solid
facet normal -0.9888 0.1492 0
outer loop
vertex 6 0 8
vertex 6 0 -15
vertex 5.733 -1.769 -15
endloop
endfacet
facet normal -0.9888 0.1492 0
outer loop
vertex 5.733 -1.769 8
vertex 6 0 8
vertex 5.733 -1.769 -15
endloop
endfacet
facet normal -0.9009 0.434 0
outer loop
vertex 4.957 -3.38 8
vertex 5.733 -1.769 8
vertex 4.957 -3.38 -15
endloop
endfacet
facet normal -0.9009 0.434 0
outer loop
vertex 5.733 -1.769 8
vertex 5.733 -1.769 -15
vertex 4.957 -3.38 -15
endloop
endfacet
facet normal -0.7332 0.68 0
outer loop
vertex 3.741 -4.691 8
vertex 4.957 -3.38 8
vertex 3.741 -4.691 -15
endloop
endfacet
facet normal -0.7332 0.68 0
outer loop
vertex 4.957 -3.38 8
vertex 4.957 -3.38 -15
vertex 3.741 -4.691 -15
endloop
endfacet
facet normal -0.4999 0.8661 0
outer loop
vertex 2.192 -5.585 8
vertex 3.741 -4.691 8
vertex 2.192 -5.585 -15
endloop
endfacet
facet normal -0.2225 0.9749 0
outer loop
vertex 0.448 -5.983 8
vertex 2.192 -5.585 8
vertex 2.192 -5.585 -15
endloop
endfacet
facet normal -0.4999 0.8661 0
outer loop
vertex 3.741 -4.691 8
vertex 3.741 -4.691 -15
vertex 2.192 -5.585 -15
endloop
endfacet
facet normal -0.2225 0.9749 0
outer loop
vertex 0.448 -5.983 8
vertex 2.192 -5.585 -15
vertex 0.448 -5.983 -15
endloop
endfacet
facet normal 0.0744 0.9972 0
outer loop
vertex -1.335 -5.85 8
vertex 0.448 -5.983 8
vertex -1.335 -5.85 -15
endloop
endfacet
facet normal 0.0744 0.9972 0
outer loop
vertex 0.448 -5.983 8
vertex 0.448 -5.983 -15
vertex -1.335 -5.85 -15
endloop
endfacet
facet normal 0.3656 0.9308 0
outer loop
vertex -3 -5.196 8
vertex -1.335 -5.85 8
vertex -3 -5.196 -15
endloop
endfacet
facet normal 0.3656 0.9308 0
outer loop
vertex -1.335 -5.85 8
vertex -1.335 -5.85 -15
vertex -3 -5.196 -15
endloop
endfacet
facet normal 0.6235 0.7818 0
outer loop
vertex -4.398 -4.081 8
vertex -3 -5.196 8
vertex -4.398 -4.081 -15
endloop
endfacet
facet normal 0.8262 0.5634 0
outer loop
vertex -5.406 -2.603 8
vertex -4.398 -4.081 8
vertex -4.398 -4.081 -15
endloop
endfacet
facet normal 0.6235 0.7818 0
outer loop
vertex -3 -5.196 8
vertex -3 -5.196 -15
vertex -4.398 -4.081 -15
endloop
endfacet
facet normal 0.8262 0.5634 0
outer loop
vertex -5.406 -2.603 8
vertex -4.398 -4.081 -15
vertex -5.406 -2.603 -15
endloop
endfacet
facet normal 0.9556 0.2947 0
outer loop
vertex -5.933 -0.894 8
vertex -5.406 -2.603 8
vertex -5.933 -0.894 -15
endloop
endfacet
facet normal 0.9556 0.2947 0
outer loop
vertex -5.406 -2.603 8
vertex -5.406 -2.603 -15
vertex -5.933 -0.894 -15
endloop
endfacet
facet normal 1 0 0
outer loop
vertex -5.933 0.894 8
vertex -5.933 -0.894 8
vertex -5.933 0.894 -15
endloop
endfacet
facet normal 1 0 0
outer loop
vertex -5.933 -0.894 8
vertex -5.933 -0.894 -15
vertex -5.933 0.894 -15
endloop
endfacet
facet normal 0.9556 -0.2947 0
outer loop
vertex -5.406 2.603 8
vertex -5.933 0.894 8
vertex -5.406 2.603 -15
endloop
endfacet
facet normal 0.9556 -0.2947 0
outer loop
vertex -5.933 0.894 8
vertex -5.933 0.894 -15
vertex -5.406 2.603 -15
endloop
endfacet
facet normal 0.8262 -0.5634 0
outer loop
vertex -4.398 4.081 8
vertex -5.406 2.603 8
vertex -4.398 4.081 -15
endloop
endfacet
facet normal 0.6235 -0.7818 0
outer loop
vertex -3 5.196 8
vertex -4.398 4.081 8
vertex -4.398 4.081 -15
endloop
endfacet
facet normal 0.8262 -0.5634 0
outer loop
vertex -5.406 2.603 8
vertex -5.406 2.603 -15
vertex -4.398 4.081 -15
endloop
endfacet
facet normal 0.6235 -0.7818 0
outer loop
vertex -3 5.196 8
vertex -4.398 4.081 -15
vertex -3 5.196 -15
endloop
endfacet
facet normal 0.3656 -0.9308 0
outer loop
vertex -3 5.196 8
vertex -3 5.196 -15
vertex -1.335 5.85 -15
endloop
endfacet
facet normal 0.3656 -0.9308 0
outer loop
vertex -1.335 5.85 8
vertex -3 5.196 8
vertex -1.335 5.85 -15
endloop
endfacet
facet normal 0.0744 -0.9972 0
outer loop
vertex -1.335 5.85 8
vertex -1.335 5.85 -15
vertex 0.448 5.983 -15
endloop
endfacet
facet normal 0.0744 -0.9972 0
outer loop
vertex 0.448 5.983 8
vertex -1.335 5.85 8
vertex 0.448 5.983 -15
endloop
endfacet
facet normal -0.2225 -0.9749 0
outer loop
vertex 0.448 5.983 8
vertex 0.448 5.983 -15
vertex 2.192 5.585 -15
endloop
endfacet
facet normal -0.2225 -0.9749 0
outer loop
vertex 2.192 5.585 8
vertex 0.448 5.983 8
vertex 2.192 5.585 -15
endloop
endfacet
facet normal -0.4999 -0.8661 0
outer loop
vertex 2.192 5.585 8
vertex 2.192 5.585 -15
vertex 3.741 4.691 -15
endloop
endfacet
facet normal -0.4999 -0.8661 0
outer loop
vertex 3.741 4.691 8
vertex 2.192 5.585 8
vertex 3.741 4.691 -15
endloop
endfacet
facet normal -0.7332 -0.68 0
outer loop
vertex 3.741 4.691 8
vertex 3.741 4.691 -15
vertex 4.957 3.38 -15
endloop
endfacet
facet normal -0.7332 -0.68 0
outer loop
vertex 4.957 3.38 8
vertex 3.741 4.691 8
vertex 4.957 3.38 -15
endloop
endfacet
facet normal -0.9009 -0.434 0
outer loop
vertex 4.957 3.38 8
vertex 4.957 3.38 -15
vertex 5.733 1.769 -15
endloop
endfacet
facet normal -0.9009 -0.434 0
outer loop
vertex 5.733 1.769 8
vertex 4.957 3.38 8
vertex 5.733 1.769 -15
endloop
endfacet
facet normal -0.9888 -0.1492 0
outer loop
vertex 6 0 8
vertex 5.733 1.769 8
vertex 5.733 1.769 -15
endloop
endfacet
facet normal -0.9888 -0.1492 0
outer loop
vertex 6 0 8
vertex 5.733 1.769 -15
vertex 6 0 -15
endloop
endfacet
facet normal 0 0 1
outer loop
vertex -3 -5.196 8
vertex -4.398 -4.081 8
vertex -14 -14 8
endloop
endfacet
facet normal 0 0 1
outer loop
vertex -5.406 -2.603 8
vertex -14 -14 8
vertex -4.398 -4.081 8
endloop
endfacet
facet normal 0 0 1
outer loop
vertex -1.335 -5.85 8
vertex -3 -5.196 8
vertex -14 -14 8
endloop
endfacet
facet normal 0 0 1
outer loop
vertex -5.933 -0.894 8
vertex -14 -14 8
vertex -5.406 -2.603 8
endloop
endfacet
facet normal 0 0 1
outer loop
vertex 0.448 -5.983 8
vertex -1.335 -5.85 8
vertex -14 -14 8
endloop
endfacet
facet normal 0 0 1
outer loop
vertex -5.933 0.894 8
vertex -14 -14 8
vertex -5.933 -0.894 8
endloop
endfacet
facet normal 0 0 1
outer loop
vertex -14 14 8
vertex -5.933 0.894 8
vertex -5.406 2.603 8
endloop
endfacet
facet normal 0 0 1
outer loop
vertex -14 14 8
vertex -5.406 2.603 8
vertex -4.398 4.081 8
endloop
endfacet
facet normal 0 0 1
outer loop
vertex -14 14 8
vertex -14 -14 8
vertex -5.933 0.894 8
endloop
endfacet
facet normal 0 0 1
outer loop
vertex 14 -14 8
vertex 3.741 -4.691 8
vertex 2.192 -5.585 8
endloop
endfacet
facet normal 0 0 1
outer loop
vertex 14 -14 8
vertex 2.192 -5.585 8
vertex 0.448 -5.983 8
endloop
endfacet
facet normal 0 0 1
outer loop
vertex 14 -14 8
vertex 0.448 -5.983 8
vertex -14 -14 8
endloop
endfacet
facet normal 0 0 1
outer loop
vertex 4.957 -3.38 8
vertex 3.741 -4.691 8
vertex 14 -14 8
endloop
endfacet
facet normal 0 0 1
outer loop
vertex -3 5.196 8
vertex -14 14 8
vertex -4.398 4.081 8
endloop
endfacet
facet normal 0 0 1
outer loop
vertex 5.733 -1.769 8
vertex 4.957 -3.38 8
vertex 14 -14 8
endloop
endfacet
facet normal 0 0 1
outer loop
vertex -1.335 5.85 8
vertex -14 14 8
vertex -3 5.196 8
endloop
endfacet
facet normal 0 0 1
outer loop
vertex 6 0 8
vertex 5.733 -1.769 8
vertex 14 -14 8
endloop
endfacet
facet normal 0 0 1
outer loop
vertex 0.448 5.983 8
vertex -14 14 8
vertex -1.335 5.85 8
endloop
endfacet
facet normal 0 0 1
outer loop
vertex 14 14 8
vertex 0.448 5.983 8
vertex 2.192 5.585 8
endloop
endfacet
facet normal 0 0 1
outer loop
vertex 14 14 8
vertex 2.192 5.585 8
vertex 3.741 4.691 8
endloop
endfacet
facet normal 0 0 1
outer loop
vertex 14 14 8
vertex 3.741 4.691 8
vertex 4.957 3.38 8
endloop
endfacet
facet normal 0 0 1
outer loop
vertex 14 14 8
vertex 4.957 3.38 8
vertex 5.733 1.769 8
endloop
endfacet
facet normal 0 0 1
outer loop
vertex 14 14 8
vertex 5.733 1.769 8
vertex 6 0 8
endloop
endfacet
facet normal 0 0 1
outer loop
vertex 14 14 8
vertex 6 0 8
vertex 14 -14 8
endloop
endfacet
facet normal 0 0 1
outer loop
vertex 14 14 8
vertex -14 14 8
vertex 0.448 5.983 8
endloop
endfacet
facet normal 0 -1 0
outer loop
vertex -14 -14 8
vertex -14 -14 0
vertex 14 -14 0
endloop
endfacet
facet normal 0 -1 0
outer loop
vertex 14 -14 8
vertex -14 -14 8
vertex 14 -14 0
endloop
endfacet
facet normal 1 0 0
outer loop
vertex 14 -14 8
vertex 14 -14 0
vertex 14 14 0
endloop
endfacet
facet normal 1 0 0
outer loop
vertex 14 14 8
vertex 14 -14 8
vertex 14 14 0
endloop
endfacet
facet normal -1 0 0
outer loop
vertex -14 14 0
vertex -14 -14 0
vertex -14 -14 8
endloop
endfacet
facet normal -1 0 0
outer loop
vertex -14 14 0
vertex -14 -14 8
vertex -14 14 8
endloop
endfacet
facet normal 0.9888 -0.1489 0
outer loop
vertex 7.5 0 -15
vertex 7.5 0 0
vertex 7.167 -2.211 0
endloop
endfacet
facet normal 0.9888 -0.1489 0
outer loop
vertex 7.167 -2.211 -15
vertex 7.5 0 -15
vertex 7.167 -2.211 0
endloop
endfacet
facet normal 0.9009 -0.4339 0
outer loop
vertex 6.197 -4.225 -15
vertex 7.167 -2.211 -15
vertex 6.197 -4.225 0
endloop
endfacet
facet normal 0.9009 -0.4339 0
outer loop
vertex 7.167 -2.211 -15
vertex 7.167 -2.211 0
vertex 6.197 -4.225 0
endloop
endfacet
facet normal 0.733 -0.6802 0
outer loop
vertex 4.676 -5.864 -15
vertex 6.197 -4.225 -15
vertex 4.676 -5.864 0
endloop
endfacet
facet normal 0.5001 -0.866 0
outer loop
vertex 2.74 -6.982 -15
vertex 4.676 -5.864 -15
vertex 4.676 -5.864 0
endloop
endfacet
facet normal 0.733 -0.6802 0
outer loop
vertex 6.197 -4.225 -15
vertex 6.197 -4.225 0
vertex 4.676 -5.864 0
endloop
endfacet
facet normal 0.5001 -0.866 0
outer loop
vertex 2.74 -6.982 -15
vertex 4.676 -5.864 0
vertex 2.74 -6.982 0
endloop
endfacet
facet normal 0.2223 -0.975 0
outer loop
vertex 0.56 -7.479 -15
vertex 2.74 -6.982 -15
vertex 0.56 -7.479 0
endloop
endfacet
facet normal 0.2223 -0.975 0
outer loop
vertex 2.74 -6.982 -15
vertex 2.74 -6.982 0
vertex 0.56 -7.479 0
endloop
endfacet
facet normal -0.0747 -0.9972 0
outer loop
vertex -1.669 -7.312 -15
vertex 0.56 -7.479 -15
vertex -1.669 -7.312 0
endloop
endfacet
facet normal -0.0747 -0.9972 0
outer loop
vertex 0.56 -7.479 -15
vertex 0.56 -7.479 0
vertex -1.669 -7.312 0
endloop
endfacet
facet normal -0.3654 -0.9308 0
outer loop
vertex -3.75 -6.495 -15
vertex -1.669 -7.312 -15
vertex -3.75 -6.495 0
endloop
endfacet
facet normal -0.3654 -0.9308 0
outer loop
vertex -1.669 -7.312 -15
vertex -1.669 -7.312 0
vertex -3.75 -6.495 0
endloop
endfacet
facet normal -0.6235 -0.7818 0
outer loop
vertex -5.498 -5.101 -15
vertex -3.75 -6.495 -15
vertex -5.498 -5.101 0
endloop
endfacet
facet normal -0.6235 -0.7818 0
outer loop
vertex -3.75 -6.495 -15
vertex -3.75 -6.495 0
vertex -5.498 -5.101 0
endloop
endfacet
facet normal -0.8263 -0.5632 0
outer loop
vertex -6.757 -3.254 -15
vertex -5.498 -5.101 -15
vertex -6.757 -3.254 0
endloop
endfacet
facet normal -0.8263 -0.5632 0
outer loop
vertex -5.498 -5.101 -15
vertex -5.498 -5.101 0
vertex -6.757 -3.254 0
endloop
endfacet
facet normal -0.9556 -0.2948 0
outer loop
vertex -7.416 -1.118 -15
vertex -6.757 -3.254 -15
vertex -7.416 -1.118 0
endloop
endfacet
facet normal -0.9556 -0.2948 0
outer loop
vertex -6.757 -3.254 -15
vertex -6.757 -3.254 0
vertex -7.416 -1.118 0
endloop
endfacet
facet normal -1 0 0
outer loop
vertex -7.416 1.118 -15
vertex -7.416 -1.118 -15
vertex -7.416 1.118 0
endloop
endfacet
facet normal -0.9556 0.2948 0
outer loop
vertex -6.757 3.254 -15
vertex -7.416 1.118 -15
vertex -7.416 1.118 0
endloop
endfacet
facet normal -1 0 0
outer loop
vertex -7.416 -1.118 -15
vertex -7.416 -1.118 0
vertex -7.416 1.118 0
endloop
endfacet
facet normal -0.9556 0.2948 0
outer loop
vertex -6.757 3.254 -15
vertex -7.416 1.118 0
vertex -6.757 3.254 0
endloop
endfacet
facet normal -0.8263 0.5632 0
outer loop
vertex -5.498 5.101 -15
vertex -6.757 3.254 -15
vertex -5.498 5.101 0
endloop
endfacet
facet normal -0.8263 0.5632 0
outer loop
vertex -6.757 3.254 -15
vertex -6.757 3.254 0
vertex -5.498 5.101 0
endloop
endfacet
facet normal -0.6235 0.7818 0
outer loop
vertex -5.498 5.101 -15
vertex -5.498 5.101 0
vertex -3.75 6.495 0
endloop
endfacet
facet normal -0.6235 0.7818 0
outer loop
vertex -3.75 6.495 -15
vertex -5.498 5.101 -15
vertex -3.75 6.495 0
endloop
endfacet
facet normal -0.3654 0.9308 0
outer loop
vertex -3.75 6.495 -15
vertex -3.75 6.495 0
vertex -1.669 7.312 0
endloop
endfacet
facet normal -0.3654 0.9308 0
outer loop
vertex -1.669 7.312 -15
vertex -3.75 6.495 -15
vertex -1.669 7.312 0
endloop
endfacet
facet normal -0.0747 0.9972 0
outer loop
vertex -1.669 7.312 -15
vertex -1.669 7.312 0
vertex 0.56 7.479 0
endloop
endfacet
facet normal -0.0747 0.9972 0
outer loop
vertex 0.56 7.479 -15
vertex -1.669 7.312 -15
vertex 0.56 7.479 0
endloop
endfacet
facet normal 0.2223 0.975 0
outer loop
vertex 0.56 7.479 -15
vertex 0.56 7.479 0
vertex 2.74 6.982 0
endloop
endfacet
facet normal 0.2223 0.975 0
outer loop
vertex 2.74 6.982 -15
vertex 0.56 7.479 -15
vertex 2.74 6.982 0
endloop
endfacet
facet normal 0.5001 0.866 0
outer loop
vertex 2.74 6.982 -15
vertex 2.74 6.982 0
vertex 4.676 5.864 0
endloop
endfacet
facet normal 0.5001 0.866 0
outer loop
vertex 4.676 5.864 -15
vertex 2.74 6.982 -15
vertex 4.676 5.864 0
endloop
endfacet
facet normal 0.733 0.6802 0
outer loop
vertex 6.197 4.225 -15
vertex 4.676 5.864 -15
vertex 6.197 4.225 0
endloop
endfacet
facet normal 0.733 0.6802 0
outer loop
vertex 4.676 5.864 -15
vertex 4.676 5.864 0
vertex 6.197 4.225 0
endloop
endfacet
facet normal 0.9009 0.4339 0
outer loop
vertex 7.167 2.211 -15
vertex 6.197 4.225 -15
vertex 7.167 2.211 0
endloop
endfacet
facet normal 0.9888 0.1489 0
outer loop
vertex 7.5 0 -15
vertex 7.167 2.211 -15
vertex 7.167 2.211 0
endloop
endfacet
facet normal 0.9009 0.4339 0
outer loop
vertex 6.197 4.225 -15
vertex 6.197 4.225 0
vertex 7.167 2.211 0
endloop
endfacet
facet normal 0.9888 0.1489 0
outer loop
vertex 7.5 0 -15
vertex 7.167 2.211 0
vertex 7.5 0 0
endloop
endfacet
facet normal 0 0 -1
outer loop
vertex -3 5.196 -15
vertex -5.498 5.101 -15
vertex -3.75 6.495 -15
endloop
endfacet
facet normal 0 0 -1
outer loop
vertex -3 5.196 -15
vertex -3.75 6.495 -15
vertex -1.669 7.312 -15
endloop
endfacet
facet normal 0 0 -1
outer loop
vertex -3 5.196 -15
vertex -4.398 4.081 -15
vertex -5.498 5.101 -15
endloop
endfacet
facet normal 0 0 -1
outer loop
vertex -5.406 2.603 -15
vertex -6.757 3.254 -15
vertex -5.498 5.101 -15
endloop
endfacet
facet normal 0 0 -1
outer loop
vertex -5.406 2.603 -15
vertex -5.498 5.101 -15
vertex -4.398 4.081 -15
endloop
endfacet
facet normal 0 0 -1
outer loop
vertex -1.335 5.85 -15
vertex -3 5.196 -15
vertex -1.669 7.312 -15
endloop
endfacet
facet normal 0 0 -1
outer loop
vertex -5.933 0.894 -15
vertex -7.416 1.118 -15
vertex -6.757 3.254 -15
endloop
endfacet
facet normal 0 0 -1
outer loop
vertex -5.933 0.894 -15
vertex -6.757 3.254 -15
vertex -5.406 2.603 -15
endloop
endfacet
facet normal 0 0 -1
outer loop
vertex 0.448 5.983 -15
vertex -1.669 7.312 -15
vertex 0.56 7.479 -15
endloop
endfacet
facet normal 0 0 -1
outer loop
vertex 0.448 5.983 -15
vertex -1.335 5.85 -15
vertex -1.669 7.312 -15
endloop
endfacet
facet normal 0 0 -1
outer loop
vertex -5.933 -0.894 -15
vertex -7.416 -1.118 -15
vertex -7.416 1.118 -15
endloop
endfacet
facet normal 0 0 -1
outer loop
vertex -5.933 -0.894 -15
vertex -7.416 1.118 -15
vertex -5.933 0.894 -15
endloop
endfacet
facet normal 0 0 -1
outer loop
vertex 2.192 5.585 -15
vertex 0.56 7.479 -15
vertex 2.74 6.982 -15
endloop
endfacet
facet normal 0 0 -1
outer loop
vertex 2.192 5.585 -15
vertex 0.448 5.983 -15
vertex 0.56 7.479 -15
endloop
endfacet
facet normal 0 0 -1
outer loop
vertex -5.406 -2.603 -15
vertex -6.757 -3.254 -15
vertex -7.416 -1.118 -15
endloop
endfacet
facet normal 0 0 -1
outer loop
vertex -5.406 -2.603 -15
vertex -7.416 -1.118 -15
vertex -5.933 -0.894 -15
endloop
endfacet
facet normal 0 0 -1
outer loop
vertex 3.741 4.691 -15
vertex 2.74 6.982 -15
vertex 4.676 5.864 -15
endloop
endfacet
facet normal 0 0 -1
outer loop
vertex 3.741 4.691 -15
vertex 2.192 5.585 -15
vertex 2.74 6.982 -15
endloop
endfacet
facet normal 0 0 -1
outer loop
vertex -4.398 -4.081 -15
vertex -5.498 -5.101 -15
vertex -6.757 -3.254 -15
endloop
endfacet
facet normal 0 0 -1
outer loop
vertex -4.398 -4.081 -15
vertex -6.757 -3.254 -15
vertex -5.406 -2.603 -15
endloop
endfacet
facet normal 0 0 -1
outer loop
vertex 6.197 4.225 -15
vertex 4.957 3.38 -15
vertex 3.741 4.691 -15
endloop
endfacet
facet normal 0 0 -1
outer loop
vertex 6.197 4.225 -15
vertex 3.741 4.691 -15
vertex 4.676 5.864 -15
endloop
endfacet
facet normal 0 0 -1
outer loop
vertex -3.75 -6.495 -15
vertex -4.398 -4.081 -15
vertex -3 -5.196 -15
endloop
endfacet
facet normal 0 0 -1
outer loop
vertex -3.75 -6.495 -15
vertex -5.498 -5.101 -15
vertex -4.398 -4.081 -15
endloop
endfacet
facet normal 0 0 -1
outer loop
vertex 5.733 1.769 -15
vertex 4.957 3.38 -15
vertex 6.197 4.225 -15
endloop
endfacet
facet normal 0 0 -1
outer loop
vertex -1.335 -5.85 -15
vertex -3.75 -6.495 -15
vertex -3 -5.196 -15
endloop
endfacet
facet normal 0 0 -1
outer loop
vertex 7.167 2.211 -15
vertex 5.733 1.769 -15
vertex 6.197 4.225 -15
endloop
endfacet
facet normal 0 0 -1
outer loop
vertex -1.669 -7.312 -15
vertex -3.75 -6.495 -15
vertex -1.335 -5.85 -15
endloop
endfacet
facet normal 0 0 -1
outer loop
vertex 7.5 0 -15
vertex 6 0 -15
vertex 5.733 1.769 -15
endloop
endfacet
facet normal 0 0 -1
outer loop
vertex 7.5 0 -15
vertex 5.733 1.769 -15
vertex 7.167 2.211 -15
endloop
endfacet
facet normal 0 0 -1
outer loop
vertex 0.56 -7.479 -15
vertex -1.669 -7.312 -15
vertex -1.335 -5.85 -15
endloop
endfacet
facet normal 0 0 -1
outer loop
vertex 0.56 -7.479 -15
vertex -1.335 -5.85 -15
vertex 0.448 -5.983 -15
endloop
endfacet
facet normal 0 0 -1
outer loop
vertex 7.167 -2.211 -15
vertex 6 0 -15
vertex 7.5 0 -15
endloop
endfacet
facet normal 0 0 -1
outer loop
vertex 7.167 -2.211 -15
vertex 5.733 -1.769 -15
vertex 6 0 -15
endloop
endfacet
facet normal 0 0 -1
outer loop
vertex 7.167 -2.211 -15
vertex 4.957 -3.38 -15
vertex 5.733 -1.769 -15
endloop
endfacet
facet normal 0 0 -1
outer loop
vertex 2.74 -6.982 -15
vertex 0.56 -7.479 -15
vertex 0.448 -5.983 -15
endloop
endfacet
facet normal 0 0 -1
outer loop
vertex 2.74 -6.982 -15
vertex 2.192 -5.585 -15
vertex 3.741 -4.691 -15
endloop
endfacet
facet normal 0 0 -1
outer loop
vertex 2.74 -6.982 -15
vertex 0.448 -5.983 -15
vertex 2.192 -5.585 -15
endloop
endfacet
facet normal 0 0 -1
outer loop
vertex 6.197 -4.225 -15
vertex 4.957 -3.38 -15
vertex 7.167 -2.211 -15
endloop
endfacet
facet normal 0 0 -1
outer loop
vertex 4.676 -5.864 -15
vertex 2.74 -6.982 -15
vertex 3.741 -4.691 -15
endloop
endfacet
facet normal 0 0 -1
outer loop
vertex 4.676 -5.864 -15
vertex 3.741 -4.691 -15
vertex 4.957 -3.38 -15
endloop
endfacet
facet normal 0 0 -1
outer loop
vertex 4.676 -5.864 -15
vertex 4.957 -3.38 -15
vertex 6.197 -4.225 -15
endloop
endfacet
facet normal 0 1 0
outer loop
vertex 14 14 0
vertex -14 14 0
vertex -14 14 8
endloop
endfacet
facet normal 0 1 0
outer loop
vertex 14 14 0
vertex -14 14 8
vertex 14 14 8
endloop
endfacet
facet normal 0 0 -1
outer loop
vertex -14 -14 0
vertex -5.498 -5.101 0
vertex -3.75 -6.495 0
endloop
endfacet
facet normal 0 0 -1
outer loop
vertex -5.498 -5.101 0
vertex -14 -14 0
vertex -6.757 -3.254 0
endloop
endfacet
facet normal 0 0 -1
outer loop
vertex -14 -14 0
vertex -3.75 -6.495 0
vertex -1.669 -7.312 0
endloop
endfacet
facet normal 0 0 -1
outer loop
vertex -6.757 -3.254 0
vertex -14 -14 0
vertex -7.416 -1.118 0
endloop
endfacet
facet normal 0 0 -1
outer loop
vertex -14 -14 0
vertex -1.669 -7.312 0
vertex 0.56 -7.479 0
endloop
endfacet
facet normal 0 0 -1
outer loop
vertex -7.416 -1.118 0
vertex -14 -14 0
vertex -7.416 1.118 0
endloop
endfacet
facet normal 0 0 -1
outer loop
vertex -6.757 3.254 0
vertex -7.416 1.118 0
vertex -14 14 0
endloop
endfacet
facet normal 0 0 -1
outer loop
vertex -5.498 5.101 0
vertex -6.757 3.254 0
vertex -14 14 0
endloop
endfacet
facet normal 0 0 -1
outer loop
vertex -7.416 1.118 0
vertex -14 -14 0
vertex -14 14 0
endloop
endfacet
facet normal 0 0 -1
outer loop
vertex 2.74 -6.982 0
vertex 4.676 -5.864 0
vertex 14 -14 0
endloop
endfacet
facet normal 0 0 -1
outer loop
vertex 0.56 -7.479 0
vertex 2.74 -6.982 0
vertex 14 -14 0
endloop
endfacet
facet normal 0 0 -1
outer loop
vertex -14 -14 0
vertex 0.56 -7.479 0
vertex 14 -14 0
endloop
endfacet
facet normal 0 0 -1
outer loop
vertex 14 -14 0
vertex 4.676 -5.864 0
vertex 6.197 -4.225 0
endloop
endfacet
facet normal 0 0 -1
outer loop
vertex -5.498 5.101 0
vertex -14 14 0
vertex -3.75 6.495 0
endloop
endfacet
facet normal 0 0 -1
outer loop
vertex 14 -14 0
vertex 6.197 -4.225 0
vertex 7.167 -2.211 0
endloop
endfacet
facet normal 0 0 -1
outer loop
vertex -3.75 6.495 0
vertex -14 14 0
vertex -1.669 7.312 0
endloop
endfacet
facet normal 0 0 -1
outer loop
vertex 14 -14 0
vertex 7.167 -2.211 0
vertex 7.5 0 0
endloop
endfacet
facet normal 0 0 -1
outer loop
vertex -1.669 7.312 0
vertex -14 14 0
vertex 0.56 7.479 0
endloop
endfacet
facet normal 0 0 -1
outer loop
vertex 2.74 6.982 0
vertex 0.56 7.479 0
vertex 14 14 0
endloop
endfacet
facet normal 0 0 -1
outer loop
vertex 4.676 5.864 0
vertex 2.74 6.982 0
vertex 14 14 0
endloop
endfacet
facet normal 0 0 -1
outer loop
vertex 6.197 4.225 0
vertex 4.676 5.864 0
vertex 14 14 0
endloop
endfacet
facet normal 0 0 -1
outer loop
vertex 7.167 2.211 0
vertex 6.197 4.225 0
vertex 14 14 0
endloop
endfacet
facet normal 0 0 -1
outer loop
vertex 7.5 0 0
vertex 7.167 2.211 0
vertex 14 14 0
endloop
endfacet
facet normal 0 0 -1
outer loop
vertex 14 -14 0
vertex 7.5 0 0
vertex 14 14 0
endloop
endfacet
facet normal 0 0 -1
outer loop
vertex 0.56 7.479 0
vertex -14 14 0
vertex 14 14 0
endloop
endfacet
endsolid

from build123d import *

# Parameters (mm, degrees)
F0_W     = 28
F0_H     = 28
F1_DEPTH = 8
F2_R     = 7.5
F3_DEPTH = 15
F4_R     = 6
F5_DEPTH = 23.001


with BuildPart() as f1:
    # F0 (on Top) → F1 (new body)
    with BuildSketch(Plane.XY):
        Rectangle(F0_W, F0_H)
    extrude(amount=F1_DEPTH)

    # F2 (on face) → F3 (join)
    with BuildSketch(Plane(origin=(0, 0, 0), x_dir=(1, 0, 0), z_dir=(0, 0, -1))):
        Circle(F2_R)
    extrude(amount=F3_DEPTH)

    # F4 (on face) → F5 (cut, through all)
    with BuildSketch(Plane(origin=(0, 0, -15), x_dir=(1, 0, 0), z_dir=(0, 0, -1))):
        Circle(F4_R)
    extrude(amount=-F5_DEPTH, mode=Mode.SUBTRACT)


solid = f1.part
